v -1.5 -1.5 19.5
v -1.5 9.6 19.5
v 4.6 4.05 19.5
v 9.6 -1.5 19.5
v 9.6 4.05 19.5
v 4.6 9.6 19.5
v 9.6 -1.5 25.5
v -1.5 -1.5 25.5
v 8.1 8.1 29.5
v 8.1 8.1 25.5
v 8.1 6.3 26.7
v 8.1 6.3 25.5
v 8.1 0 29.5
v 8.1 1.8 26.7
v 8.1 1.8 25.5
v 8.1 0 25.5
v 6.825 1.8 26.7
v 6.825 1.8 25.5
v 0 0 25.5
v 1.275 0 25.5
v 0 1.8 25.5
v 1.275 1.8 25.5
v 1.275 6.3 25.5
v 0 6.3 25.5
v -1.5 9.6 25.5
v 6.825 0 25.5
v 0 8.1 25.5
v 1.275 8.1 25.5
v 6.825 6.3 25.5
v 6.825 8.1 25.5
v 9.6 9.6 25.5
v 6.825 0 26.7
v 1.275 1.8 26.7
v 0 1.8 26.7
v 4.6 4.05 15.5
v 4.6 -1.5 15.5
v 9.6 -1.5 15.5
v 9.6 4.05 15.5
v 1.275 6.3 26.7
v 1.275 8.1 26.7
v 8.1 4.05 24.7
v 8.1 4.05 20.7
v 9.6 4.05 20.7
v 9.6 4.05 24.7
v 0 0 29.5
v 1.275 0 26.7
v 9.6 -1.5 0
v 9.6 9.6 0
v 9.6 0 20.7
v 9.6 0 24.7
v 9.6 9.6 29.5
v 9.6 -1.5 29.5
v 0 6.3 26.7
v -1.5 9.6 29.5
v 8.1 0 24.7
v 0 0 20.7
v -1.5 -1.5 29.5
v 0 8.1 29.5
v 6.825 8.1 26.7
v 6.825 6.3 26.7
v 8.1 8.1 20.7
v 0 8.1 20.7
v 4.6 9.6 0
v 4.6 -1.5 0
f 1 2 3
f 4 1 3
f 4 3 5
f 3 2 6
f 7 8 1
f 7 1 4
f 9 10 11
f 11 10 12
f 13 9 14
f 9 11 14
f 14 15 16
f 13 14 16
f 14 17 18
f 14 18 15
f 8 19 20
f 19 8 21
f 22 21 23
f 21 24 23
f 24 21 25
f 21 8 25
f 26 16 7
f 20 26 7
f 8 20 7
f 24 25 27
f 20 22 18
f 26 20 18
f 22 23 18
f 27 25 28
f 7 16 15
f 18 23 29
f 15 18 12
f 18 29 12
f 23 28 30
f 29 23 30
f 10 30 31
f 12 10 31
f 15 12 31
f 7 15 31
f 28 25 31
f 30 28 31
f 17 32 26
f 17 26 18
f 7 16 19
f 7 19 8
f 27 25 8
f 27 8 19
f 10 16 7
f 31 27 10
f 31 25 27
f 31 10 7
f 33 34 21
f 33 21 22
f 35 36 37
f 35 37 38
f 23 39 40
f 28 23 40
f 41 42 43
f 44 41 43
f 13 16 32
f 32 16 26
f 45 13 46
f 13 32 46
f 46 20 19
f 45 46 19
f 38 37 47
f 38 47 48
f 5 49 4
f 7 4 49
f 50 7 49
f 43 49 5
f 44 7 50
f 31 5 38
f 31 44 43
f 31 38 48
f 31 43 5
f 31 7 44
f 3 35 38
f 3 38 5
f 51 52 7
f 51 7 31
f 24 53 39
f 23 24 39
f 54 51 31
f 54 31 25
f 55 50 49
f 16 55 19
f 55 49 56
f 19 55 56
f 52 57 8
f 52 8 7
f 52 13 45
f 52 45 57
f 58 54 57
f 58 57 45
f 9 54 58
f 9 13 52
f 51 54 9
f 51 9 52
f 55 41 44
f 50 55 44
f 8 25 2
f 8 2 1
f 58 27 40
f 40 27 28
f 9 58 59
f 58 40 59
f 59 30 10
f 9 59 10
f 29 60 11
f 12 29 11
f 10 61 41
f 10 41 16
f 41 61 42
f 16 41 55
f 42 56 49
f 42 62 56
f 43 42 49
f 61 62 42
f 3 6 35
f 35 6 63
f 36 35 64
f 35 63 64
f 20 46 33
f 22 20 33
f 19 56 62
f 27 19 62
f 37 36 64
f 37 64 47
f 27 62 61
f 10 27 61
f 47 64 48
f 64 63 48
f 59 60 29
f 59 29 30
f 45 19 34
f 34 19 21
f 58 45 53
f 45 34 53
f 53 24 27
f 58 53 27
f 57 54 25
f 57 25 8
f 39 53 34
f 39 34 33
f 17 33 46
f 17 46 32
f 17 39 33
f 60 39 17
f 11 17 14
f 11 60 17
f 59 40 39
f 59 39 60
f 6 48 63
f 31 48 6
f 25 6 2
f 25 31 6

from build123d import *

# Parameters (mm, degrees)
SKETCH2_W           = 3.5
SKETCH2_H           = 8.1
BOSS_EXTRUDE1_DEPTH = 19.5
BOSS_EXTRUDE2_START = 19.5
SKETCH2_3_W         = 0.55
SKETCH2_3_H         = 1.5
SKETCH2_3_W_2       = 3.5
SKETCH2_3_H_2       = 8.1
BOSS_EXTRUDE2_DEPTH = 1.2
BOSS_EXTRUDE3_START = 20.7
BOSS_EXTRUDE3_DEPTH = 8.8
BOSS_EXTRUDE4_START = 26.7
SKETCH2_7_W         = 4.6
SKETCH2_7_H         = 8.1
SKETCH2_7_W_2       = 3.5
BOSS_EXTRUDE4_DEPTH = 1.2
SKETCH4_W           = 1.275
SKETCH4_H           = 1.8
CUT_EXTRUDE1_DEPTH  = 1.2
SKETCH5_W           = 4
SKETCH5_H           = 5.55
CUT_EXTRUDE2_DEPTH  = 32.616767703
SKETCH6_W           = 1.5
SKETCH6_H           = 4.05
CUT_EXTRUDE3_DEPTH  = 4


# Read off the part's stored shape, not the designer's step: Split1
with BuildPart() as part:
    # Sketch2 → Boss-Extrude1 (new body)
    with BuildSketch(Plane.XY):
        Polygon((8.1, 0), (4.6, 0), (4.6, -1.5), (9.6, -1.5), (9.6, 9.6), (4.6, 9.6), (4.6, 8.1), (8.1, 8.1), align=None)
        with Locations((6.35, 4.05)):
            Rectangle(SKETCH2_W, SKETCH2_H)
    extrude(amount=BOSS_EXTRUDE1_DEPTH)

    # Sketch2<3> → Boss-Extrude2 (add)
    with BuildSketch(Plane.XY.offset(BOSS_EXTRUDE2_START)):
        Polygon((4.05, 0), (0, 0), (0, 4.05), (-1.5, 4.05), (-1.5, -1.5), (4.05, -1.5), align=None)
        Polygon((-1.5, 4.05), (0, 4.05), (0, 8.1), (4.6, 8.1), (4.6, 9.6), (-1.5, 9.6), align=None)
        Polygon((0, 4.05), (0, 0), (4.05, 0), (4.6, 0), (4.6, 8.1), (0, 8.1), align=None)
        with Locations((4.325, -0.75)):
            Rectangle(SKETCH2_3_W, SKETCH2_3_H)
        Polygon((8.1, 0), (4.6, 0), (4.6, -1.5), (9.6, -1.5), (9.6, 9.6), (4.6, 9.6), (4.6, 8.1), (8.1, 8.1), align=None)
        with Locations((6.35, 4.05)):
            Rectangle(SKETCH2_3_W_2, SKETCH2_3_H_2)
    extrude(amount=BOSS_EXTRUDE2_DEPTH)

    # Sketch2<5> → Boss-Extrude3 (add)
    with BuildSketch(Plane.XY.offset(BOSS_EXTRUDE3_START)):
        Polygon((4.6, 0), (0, 0), (0, 8.1), (4.6, 8.1), (4.6, 9.6), (-1.5, 9.6), (-1.5, -1.5), (4.6, -1.5), align=None)
        Polygon((8.1, 0), (4.6, 0), (4.6, -1.5), (9.6, -1.5), (9.6, 9.6), (4.6, 9.6), (4.6, 8.1), (8.1, 8.1), align=None)
    extrude(amount=BOSS_EXTRUDE3_DEPTH)

    # Sketch2<7> → Boss-Extrude4 (add)
    with BuildSketch(Plane.XY.offset(BOSS_EXTRUDE4_START)):
        Polygon((4.6, 0), (0, 0), (0, 8.1), (4.6, 8.1), (4.6, 9.6), (-1.5, 9.6), (-1.5, -1.5), (4.6, -1.5), align=None)
        with Locations((2.3, 4.05)):
            Rectangle(SKETCH2_7_W, SKETCH2_7_H)
        Polygon((8.1, 0), (4.6, 0), (4.6, -1.5), (9.6, -1.5), (9.6, 9.6), (4.6, 9.6), (4.6, 8.1), (8.1, 8.1), align=None)
        with Locations((6.35, 4.05)):
            Rectangle(SKETCH2_7_W_2, SKETCH2_7_H)
    extrude(amount=-BOSS_EXTRUDE4_DEPTH)


with BuildPart() as body_2:
    # Split1: the piece on the far side of the plane
    add(part.part)
    split(bisect_by=Plane.XY.offset(25.5), keep=Keep.BOTTOM)

    # Sketch5 → Cut-Extrude2 (cut, through all)
    with BuildSketch(Plane.ZY.offset(-4.6)):
        with Locations((17.5, 1.275)):
            Rectangle(SKETCH5_W, SKETCH5_H)
    extrude(amount=-CUT_EXTRUDE2_DEPTH, mode=Mode.SUBTRACT)

    # Sketch6 → Cut-Extrude3 (cut)
    with BuildSketch(Plane.XY.offset(20.7)):
        with Locations((8.85, 2.025)):
            Rectangle(SKETCH6_W, SKETCH6_H)
    extrude(amount=CUT_EXTRUDE3_DEPTH, mode=Mode.SUBTRACT)


with BuildPart() as part_1:
    add(part.part)

    # Split1
    split(bisect_by=Plane.XY.offset(25.5), keep=Keep.TOP)

    # Sketch4 → Cut-Extrude1 (cut)
    with BuildSketch(Plane.XY.offset(26.7)):
        with Locations((0.6375, 0.9)):
            Rectangle(SKETCH4_W, SKETCH4_H)
        with Locations((7.4625, 0.9)):
            Rectangle(SKETCH4_W, SKETCH4_H)
        with Locations((0.6375, 7.2)):
            Rectangle(SKETCH4_W, SKETCH4_H)
        with Locations((7.4625, 7.2)):
            Rectangle(SKETCH4_W, SKETCH4_H)
    extrude(amount=-CUT_EXTRUDE1_DEPTH, mode=Mode.SUBTRACT)


solid = Compound([body_2.part, part_1.part])
